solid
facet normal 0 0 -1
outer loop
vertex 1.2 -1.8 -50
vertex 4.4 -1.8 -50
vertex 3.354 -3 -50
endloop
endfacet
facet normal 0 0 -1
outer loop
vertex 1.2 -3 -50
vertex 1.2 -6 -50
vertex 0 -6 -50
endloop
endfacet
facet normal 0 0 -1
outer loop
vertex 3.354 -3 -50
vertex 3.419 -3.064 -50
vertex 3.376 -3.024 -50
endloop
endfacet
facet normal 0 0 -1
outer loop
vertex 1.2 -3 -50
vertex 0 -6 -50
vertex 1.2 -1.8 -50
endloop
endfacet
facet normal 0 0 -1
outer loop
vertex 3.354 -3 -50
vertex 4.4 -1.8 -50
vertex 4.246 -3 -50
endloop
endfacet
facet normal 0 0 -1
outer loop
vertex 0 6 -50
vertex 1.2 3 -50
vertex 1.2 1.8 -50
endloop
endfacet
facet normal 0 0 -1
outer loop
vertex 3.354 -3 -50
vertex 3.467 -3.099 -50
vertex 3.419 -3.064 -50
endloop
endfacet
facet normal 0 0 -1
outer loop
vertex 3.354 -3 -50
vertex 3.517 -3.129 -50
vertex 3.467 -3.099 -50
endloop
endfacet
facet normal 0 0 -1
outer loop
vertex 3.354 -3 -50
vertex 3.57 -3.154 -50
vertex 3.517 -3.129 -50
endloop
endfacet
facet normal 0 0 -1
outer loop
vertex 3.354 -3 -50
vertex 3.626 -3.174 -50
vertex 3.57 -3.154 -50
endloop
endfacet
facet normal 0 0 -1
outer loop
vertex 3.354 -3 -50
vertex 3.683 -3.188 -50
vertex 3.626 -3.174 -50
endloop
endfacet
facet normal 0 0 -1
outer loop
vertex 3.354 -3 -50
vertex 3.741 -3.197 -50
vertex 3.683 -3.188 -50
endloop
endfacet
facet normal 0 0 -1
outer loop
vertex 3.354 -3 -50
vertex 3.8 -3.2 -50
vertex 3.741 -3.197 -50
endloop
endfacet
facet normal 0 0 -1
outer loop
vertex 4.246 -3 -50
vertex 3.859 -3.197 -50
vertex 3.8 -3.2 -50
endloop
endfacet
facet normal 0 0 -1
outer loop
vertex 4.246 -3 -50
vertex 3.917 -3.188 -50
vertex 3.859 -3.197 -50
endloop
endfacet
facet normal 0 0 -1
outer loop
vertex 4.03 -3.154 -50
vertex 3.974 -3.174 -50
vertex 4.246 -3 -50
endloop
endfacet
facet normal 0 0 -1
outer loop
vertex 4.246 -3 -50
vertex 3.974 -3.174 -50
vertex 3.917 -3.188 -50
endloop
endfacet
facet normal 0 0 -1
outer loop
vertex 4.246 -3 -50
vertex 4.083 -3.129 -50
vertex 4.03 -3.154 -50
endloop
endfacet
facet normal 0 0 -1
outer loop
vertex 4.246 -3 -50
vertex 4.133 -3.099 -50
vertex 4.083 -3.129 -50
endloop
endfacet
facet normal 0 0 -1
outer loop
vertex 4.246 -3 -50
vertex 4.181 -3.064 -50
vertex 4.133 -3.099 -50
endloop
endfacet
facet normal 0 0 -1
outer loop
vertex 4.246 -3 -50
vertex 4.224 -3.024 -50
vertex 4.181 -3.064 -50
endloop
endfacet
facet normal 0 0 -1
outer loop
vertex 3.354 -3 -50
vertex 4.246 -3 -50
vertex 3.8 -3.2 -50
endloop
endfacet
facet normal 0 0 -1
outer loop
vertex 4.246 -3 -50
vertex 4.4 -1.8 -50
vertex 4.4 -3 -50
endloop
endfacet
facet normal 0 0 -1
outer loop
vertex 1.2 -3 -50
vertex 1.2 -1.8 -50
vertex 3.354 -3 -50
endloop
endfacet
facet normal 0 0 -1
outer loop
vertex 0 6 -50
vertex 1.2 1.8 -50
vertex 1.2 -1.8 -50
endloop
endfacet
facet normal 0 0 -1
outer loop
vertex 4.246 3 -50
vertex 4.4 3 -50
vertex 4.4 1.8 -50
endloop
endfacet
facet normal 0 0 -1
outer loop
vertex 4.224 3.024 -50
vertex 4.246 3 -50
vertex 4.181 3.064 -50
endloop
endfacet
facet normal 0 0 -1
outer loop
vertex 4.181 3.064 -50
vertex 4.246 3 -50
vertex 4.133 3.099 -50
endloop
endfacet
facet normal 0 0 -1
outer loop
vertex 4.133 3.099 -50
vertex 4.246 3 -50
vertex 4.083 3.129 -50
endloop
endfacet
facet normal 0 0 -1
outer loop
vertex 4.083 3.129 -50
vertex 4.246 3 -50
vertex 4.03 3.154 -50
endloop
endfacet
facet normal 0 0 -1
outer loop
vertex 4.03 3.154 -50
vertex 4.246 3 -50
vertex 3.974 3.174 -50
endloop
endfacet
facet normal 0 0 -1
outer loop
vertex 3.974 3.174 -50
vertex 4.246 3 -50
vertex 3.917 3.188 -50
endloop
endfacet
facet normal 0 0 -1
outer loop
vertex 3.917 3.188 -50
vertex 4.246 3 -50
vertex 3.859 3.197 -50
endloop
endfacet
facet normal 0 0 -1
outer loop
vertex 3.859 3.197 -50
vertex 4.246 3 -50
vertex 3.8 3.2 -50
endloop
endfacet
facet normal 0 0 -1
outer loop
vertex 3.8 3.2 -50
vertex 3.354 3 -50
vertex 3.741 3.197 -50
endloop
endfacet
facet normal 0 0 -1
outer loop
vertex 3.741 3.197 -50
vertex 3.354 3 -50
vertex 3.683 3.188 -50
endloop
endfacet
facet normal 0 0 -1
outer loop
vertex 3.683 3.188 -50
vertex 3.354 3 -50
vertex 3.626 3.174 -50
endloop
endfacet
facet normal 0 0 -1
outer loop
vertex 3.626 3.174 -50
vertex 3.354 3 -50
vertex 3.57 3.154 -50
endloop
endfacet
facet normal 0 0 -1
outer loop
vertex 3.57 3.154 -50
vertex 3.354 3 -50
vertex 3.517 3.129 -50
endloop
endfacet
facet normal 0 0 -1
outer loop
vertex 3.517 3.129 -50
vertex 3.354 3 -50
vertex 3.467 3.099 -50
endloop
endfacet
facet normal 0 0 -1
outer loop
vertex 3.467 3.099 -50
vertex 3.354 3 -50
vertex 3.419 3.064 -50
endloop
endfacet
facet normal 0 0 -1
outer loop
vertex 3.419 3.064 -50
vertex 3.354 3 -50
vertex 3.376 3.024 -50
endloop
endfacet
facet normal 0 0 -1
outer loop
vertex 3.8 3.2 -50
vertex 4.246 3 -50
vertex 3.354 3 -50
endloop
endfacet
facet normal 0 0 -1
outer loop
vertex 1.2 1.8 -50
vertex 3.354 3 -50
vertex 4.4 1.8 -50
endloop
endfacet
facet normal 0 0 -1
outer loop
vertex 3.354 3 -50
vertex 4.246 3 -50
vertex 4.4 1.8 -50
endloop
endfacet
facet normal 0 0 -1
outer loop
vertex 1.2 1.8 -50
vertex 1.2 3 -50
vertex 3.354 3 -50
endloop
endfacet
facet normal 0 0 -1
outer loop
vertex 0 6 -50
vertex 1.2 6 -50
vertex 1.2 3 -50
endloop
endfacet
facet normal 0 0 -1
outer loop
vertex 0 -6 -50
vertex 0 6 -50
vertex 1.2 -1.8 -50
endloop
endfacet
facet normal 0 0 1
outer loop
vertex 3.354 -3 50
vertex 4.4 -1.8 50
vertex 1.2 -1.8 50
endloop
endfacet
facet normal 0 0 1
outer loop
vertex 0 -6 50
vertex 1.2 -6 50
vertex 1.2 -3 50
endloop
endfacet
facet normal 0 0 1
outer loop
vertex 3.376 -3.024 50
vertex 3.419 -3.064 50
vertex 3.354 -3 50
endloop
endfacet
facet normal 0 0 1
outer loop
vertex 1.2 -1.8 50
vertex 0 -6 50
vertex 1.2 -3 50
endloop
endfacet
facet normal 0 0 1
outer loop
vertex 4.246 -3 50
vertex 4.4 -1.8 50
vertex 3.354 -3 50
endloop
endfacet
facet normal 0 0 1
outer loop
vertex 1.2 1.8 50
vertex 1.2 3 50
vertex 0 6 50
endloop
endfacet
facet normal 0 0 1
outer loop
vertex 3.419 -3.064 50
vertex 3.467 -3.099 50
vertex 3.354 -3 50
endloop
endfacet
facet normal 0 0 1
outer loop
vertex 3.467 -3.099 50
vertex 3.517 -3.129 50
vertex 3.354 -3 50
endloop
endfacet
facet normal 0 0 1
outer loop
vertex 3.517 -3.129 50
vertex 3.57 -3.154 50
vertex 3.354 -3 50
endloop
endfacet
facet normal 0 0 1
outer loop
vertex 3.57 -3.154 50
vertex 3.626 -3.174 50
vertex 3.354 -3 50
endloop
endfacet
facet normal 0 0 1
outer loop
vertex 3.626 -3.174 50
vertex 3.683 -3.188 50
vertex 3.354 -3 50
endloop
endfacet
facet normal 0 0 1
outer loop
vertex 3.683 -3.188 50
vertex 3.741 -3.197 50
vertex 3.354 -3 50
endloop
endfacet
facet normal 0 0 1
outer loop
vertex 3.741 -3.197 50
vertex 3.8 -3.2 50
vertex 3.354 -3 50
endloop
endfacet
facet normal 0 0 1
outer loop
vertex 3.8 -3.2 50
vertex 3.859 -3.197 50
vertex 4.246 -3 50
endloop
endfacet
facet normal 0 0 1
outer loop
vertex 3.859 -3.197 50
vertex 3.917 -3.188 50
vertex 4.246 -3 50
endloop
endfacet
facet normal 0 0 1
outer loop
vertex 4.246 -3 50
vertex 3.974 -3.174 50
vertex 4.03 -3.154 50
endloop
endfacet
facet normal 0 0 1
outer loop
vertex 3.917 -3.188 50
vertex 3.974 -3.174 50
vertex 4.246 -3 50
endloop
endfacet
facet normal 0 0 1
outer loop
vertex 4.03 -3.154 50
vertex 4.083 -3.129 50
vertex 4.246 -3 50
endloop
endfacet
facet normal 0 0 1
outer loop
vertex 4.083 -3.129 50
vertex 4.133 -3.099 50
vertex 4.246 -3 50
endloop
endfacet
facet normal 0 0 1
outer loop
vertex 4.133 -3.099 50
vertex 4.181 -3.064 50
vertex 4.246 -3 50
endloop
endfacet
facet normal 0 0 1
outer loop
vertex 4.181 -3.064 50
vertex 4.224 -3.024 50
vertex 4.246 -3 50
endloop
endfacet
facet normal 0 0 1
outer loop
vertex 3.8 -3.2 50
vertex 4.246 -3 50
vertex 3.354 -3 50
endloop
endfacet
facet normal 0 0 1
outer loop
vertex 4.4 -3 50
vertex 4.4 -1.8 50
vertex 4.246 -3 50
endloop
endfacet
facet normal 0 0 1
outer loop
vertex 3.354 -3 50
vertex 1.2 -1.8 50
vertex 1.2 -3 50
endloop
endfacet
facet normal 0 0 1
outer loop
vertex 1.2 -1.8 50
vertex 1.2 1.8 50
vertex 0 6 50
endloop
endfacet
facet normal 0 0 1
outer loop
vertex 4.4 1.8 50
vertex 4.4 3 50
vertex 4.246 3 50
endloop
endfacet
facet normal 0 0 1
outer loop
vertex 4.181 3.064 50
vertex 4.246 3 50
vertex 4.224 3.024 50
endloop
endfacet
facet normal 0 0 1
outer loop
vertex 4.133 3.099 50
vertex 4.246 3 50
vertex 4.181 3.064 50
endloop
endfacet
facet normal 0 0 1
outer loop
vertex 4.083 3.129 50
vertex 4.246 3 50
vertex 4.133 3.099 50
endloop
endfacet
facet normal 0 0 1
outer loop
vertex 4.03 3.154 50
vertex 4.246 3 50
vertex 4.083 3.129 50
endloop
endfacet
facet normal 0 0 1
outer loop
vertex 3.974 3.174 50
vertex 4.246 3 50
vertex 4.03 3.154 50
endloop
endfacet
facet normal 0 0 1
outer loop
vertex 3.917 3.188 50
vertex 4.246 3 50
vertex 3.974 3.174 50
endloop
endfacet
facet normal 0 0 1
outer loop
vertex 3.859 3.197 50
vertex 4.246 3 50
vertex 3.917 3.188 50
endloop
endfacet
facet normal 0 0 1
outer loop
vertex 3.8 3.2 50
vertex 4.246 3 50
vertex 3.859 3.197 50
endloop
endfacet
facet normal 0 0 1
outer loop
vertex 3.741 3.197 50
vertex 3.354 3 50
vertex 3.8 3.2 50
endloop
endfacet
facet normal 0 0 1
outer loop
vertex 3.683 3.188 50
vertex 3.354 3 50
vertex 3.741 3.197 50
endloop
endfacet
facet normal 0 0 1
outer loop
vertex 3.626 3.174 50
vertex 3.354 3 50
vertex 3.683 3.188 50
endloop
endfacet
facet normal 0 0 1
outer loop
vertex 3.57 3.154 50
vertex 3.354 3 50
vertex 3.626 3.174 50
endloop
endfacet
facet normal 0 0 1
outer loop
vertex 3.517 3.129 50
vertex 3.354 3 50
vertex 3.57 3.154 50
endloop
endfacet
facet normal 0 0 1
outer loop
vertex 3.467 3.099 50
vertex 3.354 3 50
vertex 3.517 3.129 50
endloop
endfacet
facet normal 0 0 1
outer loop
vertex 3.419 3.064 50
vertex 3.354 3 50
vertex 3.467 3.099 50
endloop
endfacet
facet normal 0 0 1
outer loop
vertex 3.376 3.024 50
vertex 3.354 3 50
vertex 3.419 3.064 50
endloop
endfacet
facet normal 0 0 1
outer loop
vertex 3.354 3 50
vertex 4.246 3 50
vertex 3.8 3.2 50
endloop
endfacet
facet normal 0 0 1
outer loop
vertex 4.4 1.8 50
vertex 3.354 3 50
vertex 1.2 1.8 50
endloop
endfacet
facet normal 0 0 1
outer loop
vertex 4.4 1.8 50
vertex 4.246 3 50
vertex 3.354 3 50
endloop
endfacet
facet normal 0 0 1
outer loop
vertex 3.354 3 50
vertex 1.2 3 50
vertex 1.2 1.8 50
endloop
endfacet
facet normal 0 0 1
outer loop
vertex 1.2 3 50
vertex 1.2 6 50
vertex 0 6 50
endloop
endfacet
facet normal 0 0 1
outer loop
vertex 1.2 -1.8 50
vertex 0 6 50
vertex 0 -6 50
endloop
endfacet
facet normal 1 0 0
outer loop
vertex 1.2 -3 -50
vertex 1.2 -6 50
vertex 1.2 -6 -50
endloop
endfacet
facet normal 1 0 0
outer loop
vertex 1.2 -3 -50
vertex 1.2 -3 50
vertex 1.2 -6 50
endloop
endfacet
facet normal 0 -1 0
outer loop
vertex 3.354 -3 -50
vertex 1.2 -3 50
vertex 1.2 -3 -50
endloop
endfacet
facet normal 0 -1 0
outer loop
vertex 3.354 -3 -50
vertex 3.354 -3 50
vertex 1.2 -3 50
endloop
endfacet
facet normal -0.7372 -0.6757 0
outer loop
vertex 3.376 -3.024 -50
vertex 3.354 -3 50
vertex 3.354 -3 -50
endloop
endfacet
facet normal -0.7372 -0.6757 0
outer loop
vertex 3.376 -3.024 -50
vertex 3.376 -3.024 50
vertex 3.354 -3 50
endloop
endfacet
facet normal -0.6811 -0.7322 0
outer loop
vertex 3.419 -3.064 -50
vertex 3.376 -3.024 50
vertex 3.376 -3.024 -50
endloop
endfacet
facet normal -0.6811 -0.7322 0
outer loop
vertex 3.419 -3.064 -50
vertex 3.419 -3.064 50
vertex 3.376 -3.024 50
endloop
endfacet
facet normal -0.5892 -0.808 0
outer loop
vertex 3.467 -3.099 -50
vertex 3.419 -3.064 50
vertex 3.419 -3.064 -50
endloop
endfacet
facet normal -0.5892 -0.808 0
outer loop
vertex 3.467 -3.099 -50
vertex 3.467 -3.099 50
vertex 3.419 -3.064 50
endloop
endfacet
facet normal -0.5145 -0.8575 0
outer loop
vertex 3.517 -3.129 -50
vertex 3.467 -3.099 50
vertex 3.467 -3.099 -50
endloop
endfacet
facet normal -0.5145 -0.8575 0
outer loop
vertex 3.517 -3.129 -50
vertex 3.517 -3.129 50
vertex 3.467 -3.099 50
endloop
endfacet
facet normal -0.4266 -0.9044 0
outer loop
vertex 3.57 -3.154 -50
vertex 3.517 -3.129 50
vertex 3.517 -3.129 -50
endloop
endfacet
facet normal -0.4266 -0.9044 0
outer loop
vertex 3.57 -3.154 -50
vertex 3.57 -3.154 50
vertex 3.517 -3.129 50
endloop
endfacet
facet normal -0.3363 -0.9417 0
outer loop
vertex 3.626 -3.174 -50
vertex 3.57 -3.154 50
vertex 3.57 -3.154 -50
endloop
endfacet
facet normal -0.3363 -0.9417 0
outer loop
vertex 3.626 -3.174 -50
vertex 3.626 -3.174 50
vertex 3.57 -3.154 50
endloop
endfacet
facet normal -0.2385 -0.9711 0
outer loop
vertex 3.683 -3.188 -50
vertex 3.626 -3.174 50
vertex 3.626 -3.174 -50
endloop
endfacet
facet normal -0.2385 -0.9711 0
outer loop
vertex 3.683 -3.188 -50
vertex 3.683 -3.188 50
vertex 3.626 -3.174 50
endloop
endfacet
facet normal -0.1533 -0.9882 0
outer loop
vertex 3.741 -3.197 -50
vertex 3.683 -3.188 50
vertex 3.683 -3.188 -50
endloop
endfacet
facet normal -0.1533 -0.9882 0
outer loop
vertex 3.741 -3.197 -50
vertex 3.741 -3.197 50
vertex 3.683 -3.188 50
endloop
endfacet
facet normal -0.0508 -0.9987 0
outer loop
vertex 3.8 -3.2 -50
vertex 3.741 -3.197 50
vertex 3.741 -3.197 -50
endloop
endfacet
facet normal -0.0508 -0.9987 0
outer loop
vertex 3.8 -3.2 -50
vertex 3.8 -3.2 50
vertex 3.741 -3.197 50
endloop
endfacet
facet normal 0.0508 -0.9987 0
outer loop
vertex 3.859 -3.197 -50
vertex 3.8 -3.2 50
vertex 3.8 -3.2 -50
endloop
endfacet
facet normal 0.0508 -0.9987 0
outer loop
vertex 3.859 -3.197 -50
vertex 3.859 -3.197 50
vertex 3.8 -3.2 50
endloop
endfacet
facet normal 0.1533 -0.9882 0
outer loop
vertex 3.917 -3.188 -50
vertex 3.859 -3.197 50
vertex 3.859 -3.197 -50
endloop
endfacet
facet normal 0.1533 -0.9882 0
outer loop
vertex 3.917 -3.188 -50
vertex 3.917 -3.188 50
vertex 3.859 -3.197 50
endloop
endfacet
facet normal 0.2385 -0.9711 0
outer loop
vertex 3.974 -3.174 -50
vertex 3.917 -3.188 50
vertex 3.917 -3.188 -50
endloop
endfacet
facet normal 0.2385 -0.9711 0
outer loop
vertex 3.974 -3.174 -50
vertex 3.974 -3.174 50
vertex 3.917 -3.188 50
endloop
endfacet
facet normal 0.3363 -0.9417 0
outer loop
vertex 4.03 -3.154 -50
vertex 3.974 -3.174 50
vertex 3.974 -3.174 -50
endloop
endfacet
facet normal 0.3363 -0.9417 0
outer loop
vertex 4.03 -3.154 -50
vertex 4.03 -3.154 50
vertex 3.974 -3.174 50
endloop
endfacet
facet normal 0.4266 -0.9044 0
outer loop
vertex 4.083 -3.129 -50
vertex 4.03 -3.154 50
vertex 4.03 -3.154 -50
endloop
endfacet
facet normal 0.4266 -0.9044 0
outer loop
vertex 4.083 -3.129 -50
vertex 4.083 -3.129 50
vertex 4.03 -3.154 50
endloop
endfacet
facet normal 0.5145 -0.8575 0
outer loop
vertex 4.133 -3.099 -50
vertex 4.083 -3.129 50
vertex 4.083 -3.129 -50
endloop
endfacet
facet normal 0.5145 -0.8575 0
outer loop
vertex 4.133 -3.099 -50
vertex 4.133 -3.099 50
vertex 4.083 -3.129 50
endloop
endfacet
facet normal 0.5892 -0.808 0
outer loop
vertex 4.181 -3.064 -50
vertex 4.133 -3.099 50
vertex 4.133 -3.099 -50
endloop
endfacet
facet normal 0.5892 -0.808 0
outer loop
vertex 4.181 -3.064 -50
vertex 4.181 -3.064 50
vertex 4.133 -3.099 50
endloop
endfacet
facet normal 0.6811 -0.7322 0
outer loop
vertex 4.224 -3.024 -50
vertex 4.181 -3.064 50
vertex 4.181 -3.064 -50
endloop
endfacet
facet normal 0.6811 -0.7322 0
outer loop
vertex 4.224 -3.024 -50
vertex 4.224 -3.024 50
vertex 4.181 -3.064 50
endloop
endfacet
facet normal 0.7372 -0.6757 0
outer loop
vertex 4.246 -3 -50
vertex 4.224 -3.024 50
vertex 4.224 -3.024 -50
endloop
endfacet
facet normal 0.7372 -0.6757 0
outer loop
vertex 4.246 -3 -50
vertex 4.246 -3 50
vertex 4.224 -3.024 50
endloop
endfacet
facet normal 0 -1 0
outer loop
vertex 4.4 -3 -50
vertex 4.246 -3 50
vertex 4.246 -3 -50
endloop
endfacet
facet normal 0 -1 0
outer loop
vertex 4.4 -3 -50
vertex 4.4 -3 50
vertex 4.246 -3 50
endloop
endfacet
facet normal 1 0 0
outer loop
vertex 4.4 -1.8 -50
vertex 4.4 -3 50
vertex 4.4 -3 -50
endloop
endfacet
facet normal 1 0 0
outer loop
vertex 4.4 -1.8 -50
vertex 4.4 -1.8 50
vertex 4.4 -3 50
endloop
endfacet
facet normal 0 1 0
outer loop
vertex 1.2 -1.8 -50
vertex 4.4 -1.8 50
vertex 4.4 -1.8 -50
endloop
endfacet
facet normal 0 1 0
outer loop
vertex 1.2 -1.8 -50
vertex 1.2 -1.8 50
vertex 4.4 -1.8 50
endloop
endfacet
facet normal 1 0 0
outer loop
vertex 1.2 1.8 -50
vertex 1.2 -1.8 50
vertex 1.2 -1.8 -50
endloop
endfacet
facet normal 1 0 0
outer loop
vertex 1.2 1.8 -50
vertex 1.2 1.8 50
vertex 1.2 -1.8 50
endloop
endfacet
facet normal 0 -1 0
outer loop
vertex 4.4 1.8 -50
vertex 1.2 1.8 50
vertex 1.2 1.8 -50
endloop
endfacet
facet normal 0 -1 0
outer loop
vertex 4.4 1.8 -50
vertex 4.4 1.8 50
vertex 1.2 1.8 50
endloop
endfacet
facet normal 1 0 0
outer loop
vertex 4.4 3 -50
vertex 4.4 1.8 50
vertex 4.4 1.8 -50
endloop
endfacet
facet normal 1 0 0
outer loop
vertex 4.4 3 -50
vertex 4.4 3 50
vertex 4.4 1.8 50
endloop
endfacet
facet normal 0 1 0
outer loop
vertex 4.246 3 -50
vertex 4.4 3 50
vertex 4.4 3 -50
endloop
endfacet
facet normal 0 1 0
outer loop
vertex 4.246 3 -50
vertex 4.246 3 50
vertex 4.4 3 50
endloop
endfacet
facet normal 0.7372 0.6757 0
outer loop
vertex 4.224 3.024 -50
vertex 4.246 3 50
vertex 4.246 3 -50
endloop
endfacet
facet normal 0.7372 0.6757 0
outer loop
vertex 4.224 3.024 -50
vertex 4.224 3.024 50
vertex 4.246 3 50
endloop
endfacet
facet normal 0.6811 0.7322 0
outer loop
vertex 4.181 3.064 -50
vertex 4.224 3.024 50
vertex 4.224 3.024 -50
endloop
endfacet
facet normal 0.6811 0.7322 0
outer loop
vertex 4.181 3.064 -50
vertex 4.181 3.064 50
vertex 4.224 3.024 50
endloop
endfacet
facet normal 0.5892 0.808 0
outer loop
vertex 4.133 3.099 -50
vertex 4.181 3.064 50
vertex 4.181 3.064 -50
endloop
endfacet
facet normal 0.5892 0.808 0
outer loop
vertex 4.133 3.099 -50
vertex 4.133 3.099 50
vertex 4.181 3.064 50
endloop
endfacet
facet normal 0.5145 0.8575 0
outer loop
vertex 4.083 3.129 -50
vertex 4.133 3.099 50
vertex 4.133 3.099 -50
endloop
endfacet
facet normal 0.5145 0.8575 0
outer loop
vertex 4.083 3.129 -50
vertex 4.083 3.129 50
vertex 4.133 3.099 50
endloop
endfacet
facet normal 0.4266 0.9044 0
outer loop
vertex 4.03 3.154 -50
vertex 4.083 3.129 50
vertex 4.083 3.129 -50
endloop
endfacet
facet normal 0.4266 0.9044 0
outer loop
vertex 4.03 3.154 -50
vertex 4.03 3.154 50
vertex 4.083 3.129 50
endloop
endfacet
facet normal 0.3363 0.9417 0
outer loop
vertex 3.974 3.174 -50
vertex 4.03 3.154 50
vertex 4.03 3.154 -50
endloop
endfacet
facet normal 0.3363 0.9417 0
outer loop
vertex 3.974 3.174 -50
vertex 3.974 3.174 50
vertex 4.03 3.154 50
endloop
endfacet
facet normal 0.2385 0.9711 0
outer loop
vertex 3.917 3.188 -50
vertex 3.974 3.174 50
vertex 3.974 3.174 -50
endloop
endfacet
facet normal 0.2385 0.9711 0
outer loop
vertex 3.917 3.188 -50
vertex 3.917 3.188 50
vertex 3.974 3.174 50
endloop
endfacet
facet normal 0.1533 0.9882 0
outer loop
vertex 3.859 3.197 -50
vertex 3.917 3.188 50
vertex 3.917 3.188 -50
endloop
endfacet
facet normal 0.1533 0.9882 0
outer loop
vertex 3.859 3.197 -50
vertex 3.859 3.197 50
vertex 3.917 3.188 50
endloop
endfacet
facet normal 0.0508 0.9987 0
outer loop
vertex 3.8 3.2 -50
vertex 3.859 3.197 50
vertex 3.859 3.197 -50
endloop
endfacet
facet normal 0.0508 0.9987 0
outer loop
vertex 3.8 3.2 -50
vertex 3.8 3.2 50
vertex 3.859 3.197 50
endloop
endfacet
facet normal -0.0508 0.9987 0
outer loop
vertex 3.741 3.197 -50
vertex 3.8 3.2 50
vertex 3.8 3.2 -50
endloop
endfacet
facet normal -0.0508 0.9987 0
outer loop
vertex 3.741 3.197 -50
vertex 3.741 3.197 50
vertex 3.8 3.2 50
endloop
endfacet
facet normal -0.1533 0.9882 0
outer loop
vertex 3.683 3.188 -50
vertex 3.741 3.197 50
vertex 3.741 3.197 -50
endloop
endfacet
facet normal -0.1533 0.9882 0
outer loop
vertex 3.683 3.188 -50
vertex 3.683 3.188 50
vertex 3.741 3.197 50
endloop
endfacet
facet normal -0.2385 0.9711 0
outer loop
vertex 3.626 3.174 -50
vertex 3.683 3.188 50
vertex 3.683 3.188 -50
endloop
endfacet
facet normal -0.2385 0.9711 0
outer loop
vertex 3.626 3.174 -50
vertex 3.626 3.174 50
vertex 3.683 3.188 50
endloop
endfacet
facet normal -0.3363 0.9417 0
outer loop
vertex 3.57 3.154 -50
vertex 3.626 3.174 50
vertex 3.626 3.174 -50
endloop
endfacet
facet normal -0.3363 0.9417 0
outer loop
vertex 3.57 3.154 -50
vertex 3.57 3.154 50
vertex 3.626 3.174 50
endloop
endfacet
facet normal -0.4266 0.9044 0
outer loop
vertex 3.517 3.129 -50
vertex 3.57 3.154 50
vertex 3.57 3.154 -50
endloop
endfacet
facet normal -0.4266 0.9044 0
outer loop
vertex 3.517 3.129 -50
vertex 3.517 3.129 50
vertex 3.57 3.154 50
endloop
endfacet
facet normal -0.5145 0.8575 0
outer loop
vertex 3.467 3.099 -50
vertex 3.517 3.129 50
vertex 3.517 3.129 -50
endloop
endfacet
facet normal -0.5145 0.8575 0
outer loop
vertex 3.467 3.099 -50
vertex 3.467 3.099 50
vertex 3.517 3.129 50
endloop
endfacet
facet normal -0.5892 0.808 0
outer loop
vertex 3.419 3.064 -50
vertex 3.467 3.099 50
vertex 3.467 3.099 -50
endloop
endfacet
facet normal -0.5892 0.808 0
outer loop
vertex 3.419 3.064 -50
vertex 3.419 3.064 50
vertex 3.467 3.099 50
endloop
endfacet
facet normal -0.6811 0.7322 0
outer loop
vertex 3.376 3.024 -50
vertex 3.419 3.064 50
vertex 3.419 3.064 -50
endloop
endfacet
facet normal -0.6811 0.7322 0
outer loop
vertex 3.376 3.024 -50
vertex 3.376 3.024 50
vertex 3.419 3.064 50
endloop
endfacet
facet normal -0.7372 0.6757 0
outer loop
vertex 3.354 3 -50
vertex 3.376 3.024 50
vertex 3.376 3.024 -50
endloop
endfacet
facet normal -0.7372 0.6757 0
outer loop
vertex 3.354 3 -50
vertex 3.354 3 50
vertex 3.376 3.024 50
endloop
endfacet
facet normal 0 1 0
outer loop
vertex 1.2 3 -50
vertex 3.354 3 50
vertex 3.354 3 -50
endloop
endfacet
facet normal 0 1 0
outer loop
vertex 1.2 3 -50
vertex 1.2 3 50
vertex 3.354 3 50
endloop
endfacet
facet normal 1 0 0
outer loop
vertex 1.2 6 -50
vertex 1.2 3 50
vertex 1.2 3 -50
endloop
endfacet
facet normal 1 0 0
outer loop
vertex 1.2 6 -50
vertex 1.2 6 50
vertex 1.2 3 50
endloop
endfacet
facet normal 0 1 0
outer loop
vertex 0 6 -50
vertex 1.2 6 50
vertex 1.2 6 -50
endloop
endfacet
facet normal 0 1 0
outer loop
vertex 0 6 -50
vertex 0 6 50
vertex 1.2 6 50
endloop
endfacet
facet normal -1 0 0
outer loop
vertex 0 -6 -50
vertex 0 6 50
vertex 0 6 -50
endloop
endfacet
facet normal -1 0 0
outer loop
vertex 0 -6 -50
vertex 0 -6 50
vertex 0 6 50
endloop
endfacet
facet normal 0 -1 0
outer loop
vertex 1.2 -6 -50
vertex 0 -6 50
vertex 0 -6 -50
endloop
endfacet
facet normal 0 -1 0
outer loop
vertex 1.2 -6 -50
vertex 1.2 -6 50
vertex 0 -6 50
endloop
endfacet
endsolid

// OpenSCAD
$fn=64;
// Set cover hieght
cover_height=100;

thck = 1.2;
width = 12;
offset = (width - 6) / 2;

module half_cover()
union(){
    square([thck, width/2]);
    translate([thck,offset,0])
    union(){
        square([3.2,thck]);
        translate([2.6,0.4,0])
        circle(d=thck);
    }
}


linear_extrude(height = cover_height, center = true, convexity = 10, twist = 0)
union() {
    translate([0,6,0])
    mirror([0,1,0])
    half_cover();
    translate([0,-6,0])
half_cover();
}
